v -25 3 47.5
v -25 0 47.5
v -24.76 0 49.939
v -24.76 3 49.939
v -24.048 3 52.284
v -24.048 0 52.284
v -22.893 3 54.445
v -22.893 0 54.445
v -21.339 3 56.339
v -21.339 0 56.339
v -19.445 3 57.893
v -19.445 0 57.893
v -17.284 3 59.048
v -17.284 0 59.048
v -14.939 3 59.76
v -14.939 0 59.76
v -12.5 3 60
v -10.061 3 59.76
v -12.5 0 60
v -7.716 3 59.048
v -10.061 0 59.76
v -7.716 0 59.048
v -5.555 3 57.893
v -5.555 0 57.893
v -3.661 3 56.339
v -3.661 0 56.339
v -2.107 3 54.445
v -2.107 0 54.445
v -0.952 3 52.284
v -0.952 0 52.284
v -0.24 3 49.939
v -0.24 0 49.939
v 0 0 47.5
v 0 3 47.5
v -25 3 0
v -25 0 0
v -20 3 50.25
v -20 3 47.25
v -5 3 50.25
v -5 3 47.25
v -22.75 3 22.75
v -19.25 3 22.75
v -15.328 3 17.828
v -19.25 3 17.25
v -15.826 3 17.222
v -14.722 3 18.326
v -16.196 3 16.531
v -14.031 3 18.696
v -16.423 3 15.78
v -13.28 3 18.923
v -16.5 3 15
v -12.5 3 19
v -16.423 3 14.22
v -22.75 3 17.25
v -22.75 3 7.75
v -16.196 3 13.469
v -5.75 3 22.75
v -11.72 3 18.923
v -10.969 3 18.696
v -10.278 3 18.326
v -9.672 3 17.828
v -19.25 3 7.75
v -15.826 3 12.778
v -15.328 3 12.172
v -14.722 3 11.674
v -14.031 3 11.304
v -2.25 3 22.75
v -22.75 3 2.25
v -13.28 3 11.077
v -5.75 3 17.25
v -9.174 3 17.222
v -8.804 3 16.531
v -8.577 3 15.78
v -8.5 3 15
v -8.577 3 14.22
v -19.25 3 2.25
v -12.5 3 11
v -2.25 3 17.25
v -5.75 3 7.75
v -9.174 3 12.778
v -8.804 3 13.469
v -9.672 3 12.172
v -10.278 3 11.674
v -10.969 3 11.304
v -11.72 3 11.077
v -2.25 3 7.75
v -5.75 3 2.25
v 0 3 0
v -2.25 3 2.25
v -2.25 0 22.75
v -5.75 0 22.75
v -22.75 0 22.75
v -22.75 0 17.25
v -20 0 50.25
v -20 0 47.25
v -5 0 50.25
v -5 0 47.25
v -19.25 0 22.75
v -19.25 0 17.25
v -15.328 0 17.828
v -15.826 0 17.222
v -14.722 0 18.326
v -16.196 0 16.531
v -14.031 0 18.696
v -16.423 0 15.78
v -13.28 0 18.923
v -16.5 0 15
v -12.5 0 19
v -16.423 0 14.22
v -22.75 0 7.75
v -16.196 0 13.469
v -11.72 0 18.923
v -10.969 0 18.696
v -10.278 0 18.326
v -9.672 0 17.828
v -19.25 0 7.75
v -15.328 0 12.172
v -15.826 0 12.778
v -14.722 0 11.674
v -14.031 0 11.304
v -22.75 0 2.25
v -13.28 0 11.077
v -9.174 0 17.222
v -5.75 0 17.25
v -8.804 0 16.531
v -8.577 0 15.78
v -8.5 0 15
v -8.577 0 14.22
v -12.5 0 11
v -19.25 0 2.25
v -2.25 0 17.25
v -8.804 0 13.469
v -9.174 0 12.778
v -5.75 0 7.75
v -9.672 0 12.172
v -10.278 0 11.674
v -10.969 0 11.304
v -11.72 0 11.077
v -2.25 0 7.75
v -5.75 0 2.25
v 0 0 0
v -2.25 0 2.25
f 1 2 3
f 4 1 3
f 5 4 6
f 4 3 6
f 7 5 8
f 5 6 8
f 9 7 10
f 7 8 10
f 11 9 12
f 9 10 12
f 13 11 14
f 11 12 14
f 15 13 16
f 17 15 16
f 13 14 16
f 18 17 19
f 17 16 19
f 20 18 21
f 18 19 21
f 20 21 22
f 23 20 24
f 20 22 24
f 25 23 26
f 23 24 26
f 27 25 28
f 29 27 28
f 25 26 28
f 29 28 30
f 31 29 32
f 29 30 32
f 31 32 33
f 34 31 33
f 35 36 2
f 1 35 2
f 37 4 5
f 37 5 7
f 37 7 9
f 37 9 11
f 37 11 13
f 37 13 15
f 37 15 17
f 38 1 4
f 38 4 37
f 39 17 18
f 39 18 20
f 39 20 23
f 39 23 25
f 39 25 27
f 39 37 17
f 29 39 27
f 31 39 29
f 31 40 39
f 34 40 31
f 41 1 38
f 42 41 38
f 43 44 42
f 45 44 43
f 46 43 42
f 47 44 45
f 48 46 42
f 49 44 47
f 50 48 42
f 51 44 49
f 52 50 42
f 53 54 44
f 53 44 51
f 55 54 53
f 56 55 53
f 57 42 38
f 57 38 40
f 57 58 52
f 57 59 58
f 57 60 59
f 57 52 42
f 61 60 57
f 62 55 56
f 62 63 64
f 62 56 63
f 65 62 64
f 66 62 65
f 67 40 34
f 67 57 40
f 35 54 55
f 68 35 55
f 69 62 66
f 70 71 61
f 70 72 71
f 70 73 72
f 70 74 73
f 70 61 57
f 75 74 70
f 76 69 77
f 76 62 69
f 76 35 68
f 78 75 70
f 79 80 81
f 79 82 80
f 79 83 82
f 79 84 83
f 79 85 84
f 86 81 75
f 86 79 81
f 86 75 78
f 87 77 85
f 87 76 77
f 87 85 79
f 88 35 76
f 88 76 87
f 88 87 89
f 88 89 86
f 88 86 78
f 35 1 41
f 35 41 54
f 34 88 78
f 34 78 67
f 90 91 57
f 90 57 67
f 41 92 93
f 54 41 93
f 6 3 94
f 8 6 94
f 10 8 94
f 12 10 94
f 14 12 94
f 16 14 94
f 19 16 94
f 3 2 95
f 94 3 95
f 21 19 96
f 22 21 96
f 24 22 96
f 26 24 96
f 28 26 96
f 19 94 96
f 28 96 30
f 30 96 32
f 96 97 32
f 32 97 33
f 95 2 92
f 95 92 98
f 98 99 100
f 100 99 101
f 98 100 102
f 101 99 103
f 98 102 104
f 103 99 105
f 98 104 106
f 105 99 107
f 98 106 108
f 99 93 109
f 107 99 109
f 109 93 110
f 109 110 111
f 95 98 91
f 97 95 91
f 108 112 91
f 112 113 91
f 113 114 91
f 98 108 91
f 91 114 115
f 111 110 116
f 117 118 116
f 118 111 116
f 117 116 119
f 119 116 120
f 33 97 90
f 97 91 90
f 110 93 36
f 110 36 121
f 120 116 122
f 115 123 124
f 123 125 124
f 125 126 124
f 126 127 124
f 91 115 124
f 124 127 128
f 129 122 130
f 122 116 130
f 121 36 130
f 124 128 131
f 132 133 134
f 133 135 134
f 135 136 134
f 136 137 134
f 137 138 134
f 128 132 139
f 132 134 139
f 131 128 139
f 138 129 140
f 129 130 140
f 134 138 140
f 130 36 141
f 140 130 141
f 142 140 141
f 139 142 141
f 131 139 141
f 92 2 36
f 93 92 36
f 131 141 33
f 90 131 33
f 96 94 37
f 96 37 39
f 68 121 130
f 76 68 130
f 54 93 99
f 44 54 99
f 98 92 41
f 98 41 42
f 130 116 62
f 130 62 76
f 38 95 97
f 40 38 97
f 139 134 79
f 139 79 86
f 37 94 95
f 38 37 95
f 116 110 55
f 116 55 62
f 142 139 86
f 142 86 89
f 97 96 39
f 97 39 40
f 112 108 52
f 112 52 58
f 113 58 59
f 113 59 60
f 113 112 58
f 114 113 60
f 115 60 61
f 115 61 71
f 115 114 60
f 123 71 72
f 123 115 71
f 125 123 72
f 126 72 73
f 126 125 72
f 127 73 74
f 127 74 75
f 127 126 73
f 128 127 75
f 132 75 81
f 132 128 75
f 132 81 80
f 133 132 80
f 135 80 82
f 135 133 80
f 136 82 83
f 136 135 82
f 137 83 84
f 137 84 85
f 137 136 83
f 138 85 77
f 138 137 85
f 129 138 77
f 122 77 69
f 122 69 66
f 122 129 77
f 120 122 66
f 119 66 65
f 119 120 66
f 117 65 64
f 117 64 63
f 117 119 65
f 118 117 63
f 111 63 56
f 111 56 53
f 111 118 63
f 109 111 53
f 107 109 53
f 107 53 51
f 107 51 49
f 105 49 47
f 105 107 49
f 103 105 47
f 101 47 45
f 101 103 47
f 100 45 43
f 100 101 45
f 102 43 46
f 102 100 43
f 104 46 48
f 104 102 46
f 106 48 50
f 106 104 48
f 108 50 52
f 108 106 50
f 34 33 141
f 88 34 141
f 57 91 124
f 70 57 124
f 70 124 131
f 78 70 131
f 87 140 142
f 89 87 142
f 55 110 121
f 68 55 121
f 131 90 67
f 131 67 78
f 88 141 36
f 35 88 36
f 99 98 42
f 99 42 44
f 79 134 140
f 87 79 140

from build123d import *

# Parameters (mm, degrees)
SKETCH1_R           = 4
SKETCH1_W           = 3.5
SKETCH1_H           = 5.5
SKETCH1_W_2         = 15
SKETCH1_H_2         = 3
BOSS_EXTRUDE1_DEPTH = 3


with BuildPart() as part:
    # Sketch1 → Boss-Extrude1 (new body)
    with BuildSketch(Plane(origin=(0, 0, 0), x_dir=(1, 0, 0), z_dir=(0, 1, 0))):
        with BuildLine():
            Line((0, 0), (-25, 0))
            Line((-25, 0), (-25, -47.5))
            ThreePointArc((-25, -47.5), (-12.5, -60), (0, -47.5))
            Line((0, -47.5), (0, 0))
        make_face()
        with Locations(Location((-12.5, -15, 0), (0, 0, 270))):
            Circle(SKETCH1_R, mode=Mode.SUBTRACT)
        with Locations((-21, -5)):
            Rectangle(SKETCH1_W, SKETCH1_H, mode=Mode.SUBTRACT)
        with Locations((-4, -5)):
            Rectangle(SKETCH1_W, SKETCH1_H, mode=Mode.SUBTRACT)
        with Locations((-21, -20)):
            Rectangle(SKETCH1_W, SKETCH1_H, mode=Mode.SUBTRACT)
        with Locations((-4, -20)):
            Rectangle(SKETCH1_W, SKETCH1_H, mode=Mode.SUBTRACT)
        with Locations((-12.5, -48.75)):
            Rectangle(SKETCH1_W_2, SKETCH1_H_2, mode=Mode.SUBTRACT)
    extrude(amount=BOSS_EXTRUDE1_DEPTH)


solid = part.part
